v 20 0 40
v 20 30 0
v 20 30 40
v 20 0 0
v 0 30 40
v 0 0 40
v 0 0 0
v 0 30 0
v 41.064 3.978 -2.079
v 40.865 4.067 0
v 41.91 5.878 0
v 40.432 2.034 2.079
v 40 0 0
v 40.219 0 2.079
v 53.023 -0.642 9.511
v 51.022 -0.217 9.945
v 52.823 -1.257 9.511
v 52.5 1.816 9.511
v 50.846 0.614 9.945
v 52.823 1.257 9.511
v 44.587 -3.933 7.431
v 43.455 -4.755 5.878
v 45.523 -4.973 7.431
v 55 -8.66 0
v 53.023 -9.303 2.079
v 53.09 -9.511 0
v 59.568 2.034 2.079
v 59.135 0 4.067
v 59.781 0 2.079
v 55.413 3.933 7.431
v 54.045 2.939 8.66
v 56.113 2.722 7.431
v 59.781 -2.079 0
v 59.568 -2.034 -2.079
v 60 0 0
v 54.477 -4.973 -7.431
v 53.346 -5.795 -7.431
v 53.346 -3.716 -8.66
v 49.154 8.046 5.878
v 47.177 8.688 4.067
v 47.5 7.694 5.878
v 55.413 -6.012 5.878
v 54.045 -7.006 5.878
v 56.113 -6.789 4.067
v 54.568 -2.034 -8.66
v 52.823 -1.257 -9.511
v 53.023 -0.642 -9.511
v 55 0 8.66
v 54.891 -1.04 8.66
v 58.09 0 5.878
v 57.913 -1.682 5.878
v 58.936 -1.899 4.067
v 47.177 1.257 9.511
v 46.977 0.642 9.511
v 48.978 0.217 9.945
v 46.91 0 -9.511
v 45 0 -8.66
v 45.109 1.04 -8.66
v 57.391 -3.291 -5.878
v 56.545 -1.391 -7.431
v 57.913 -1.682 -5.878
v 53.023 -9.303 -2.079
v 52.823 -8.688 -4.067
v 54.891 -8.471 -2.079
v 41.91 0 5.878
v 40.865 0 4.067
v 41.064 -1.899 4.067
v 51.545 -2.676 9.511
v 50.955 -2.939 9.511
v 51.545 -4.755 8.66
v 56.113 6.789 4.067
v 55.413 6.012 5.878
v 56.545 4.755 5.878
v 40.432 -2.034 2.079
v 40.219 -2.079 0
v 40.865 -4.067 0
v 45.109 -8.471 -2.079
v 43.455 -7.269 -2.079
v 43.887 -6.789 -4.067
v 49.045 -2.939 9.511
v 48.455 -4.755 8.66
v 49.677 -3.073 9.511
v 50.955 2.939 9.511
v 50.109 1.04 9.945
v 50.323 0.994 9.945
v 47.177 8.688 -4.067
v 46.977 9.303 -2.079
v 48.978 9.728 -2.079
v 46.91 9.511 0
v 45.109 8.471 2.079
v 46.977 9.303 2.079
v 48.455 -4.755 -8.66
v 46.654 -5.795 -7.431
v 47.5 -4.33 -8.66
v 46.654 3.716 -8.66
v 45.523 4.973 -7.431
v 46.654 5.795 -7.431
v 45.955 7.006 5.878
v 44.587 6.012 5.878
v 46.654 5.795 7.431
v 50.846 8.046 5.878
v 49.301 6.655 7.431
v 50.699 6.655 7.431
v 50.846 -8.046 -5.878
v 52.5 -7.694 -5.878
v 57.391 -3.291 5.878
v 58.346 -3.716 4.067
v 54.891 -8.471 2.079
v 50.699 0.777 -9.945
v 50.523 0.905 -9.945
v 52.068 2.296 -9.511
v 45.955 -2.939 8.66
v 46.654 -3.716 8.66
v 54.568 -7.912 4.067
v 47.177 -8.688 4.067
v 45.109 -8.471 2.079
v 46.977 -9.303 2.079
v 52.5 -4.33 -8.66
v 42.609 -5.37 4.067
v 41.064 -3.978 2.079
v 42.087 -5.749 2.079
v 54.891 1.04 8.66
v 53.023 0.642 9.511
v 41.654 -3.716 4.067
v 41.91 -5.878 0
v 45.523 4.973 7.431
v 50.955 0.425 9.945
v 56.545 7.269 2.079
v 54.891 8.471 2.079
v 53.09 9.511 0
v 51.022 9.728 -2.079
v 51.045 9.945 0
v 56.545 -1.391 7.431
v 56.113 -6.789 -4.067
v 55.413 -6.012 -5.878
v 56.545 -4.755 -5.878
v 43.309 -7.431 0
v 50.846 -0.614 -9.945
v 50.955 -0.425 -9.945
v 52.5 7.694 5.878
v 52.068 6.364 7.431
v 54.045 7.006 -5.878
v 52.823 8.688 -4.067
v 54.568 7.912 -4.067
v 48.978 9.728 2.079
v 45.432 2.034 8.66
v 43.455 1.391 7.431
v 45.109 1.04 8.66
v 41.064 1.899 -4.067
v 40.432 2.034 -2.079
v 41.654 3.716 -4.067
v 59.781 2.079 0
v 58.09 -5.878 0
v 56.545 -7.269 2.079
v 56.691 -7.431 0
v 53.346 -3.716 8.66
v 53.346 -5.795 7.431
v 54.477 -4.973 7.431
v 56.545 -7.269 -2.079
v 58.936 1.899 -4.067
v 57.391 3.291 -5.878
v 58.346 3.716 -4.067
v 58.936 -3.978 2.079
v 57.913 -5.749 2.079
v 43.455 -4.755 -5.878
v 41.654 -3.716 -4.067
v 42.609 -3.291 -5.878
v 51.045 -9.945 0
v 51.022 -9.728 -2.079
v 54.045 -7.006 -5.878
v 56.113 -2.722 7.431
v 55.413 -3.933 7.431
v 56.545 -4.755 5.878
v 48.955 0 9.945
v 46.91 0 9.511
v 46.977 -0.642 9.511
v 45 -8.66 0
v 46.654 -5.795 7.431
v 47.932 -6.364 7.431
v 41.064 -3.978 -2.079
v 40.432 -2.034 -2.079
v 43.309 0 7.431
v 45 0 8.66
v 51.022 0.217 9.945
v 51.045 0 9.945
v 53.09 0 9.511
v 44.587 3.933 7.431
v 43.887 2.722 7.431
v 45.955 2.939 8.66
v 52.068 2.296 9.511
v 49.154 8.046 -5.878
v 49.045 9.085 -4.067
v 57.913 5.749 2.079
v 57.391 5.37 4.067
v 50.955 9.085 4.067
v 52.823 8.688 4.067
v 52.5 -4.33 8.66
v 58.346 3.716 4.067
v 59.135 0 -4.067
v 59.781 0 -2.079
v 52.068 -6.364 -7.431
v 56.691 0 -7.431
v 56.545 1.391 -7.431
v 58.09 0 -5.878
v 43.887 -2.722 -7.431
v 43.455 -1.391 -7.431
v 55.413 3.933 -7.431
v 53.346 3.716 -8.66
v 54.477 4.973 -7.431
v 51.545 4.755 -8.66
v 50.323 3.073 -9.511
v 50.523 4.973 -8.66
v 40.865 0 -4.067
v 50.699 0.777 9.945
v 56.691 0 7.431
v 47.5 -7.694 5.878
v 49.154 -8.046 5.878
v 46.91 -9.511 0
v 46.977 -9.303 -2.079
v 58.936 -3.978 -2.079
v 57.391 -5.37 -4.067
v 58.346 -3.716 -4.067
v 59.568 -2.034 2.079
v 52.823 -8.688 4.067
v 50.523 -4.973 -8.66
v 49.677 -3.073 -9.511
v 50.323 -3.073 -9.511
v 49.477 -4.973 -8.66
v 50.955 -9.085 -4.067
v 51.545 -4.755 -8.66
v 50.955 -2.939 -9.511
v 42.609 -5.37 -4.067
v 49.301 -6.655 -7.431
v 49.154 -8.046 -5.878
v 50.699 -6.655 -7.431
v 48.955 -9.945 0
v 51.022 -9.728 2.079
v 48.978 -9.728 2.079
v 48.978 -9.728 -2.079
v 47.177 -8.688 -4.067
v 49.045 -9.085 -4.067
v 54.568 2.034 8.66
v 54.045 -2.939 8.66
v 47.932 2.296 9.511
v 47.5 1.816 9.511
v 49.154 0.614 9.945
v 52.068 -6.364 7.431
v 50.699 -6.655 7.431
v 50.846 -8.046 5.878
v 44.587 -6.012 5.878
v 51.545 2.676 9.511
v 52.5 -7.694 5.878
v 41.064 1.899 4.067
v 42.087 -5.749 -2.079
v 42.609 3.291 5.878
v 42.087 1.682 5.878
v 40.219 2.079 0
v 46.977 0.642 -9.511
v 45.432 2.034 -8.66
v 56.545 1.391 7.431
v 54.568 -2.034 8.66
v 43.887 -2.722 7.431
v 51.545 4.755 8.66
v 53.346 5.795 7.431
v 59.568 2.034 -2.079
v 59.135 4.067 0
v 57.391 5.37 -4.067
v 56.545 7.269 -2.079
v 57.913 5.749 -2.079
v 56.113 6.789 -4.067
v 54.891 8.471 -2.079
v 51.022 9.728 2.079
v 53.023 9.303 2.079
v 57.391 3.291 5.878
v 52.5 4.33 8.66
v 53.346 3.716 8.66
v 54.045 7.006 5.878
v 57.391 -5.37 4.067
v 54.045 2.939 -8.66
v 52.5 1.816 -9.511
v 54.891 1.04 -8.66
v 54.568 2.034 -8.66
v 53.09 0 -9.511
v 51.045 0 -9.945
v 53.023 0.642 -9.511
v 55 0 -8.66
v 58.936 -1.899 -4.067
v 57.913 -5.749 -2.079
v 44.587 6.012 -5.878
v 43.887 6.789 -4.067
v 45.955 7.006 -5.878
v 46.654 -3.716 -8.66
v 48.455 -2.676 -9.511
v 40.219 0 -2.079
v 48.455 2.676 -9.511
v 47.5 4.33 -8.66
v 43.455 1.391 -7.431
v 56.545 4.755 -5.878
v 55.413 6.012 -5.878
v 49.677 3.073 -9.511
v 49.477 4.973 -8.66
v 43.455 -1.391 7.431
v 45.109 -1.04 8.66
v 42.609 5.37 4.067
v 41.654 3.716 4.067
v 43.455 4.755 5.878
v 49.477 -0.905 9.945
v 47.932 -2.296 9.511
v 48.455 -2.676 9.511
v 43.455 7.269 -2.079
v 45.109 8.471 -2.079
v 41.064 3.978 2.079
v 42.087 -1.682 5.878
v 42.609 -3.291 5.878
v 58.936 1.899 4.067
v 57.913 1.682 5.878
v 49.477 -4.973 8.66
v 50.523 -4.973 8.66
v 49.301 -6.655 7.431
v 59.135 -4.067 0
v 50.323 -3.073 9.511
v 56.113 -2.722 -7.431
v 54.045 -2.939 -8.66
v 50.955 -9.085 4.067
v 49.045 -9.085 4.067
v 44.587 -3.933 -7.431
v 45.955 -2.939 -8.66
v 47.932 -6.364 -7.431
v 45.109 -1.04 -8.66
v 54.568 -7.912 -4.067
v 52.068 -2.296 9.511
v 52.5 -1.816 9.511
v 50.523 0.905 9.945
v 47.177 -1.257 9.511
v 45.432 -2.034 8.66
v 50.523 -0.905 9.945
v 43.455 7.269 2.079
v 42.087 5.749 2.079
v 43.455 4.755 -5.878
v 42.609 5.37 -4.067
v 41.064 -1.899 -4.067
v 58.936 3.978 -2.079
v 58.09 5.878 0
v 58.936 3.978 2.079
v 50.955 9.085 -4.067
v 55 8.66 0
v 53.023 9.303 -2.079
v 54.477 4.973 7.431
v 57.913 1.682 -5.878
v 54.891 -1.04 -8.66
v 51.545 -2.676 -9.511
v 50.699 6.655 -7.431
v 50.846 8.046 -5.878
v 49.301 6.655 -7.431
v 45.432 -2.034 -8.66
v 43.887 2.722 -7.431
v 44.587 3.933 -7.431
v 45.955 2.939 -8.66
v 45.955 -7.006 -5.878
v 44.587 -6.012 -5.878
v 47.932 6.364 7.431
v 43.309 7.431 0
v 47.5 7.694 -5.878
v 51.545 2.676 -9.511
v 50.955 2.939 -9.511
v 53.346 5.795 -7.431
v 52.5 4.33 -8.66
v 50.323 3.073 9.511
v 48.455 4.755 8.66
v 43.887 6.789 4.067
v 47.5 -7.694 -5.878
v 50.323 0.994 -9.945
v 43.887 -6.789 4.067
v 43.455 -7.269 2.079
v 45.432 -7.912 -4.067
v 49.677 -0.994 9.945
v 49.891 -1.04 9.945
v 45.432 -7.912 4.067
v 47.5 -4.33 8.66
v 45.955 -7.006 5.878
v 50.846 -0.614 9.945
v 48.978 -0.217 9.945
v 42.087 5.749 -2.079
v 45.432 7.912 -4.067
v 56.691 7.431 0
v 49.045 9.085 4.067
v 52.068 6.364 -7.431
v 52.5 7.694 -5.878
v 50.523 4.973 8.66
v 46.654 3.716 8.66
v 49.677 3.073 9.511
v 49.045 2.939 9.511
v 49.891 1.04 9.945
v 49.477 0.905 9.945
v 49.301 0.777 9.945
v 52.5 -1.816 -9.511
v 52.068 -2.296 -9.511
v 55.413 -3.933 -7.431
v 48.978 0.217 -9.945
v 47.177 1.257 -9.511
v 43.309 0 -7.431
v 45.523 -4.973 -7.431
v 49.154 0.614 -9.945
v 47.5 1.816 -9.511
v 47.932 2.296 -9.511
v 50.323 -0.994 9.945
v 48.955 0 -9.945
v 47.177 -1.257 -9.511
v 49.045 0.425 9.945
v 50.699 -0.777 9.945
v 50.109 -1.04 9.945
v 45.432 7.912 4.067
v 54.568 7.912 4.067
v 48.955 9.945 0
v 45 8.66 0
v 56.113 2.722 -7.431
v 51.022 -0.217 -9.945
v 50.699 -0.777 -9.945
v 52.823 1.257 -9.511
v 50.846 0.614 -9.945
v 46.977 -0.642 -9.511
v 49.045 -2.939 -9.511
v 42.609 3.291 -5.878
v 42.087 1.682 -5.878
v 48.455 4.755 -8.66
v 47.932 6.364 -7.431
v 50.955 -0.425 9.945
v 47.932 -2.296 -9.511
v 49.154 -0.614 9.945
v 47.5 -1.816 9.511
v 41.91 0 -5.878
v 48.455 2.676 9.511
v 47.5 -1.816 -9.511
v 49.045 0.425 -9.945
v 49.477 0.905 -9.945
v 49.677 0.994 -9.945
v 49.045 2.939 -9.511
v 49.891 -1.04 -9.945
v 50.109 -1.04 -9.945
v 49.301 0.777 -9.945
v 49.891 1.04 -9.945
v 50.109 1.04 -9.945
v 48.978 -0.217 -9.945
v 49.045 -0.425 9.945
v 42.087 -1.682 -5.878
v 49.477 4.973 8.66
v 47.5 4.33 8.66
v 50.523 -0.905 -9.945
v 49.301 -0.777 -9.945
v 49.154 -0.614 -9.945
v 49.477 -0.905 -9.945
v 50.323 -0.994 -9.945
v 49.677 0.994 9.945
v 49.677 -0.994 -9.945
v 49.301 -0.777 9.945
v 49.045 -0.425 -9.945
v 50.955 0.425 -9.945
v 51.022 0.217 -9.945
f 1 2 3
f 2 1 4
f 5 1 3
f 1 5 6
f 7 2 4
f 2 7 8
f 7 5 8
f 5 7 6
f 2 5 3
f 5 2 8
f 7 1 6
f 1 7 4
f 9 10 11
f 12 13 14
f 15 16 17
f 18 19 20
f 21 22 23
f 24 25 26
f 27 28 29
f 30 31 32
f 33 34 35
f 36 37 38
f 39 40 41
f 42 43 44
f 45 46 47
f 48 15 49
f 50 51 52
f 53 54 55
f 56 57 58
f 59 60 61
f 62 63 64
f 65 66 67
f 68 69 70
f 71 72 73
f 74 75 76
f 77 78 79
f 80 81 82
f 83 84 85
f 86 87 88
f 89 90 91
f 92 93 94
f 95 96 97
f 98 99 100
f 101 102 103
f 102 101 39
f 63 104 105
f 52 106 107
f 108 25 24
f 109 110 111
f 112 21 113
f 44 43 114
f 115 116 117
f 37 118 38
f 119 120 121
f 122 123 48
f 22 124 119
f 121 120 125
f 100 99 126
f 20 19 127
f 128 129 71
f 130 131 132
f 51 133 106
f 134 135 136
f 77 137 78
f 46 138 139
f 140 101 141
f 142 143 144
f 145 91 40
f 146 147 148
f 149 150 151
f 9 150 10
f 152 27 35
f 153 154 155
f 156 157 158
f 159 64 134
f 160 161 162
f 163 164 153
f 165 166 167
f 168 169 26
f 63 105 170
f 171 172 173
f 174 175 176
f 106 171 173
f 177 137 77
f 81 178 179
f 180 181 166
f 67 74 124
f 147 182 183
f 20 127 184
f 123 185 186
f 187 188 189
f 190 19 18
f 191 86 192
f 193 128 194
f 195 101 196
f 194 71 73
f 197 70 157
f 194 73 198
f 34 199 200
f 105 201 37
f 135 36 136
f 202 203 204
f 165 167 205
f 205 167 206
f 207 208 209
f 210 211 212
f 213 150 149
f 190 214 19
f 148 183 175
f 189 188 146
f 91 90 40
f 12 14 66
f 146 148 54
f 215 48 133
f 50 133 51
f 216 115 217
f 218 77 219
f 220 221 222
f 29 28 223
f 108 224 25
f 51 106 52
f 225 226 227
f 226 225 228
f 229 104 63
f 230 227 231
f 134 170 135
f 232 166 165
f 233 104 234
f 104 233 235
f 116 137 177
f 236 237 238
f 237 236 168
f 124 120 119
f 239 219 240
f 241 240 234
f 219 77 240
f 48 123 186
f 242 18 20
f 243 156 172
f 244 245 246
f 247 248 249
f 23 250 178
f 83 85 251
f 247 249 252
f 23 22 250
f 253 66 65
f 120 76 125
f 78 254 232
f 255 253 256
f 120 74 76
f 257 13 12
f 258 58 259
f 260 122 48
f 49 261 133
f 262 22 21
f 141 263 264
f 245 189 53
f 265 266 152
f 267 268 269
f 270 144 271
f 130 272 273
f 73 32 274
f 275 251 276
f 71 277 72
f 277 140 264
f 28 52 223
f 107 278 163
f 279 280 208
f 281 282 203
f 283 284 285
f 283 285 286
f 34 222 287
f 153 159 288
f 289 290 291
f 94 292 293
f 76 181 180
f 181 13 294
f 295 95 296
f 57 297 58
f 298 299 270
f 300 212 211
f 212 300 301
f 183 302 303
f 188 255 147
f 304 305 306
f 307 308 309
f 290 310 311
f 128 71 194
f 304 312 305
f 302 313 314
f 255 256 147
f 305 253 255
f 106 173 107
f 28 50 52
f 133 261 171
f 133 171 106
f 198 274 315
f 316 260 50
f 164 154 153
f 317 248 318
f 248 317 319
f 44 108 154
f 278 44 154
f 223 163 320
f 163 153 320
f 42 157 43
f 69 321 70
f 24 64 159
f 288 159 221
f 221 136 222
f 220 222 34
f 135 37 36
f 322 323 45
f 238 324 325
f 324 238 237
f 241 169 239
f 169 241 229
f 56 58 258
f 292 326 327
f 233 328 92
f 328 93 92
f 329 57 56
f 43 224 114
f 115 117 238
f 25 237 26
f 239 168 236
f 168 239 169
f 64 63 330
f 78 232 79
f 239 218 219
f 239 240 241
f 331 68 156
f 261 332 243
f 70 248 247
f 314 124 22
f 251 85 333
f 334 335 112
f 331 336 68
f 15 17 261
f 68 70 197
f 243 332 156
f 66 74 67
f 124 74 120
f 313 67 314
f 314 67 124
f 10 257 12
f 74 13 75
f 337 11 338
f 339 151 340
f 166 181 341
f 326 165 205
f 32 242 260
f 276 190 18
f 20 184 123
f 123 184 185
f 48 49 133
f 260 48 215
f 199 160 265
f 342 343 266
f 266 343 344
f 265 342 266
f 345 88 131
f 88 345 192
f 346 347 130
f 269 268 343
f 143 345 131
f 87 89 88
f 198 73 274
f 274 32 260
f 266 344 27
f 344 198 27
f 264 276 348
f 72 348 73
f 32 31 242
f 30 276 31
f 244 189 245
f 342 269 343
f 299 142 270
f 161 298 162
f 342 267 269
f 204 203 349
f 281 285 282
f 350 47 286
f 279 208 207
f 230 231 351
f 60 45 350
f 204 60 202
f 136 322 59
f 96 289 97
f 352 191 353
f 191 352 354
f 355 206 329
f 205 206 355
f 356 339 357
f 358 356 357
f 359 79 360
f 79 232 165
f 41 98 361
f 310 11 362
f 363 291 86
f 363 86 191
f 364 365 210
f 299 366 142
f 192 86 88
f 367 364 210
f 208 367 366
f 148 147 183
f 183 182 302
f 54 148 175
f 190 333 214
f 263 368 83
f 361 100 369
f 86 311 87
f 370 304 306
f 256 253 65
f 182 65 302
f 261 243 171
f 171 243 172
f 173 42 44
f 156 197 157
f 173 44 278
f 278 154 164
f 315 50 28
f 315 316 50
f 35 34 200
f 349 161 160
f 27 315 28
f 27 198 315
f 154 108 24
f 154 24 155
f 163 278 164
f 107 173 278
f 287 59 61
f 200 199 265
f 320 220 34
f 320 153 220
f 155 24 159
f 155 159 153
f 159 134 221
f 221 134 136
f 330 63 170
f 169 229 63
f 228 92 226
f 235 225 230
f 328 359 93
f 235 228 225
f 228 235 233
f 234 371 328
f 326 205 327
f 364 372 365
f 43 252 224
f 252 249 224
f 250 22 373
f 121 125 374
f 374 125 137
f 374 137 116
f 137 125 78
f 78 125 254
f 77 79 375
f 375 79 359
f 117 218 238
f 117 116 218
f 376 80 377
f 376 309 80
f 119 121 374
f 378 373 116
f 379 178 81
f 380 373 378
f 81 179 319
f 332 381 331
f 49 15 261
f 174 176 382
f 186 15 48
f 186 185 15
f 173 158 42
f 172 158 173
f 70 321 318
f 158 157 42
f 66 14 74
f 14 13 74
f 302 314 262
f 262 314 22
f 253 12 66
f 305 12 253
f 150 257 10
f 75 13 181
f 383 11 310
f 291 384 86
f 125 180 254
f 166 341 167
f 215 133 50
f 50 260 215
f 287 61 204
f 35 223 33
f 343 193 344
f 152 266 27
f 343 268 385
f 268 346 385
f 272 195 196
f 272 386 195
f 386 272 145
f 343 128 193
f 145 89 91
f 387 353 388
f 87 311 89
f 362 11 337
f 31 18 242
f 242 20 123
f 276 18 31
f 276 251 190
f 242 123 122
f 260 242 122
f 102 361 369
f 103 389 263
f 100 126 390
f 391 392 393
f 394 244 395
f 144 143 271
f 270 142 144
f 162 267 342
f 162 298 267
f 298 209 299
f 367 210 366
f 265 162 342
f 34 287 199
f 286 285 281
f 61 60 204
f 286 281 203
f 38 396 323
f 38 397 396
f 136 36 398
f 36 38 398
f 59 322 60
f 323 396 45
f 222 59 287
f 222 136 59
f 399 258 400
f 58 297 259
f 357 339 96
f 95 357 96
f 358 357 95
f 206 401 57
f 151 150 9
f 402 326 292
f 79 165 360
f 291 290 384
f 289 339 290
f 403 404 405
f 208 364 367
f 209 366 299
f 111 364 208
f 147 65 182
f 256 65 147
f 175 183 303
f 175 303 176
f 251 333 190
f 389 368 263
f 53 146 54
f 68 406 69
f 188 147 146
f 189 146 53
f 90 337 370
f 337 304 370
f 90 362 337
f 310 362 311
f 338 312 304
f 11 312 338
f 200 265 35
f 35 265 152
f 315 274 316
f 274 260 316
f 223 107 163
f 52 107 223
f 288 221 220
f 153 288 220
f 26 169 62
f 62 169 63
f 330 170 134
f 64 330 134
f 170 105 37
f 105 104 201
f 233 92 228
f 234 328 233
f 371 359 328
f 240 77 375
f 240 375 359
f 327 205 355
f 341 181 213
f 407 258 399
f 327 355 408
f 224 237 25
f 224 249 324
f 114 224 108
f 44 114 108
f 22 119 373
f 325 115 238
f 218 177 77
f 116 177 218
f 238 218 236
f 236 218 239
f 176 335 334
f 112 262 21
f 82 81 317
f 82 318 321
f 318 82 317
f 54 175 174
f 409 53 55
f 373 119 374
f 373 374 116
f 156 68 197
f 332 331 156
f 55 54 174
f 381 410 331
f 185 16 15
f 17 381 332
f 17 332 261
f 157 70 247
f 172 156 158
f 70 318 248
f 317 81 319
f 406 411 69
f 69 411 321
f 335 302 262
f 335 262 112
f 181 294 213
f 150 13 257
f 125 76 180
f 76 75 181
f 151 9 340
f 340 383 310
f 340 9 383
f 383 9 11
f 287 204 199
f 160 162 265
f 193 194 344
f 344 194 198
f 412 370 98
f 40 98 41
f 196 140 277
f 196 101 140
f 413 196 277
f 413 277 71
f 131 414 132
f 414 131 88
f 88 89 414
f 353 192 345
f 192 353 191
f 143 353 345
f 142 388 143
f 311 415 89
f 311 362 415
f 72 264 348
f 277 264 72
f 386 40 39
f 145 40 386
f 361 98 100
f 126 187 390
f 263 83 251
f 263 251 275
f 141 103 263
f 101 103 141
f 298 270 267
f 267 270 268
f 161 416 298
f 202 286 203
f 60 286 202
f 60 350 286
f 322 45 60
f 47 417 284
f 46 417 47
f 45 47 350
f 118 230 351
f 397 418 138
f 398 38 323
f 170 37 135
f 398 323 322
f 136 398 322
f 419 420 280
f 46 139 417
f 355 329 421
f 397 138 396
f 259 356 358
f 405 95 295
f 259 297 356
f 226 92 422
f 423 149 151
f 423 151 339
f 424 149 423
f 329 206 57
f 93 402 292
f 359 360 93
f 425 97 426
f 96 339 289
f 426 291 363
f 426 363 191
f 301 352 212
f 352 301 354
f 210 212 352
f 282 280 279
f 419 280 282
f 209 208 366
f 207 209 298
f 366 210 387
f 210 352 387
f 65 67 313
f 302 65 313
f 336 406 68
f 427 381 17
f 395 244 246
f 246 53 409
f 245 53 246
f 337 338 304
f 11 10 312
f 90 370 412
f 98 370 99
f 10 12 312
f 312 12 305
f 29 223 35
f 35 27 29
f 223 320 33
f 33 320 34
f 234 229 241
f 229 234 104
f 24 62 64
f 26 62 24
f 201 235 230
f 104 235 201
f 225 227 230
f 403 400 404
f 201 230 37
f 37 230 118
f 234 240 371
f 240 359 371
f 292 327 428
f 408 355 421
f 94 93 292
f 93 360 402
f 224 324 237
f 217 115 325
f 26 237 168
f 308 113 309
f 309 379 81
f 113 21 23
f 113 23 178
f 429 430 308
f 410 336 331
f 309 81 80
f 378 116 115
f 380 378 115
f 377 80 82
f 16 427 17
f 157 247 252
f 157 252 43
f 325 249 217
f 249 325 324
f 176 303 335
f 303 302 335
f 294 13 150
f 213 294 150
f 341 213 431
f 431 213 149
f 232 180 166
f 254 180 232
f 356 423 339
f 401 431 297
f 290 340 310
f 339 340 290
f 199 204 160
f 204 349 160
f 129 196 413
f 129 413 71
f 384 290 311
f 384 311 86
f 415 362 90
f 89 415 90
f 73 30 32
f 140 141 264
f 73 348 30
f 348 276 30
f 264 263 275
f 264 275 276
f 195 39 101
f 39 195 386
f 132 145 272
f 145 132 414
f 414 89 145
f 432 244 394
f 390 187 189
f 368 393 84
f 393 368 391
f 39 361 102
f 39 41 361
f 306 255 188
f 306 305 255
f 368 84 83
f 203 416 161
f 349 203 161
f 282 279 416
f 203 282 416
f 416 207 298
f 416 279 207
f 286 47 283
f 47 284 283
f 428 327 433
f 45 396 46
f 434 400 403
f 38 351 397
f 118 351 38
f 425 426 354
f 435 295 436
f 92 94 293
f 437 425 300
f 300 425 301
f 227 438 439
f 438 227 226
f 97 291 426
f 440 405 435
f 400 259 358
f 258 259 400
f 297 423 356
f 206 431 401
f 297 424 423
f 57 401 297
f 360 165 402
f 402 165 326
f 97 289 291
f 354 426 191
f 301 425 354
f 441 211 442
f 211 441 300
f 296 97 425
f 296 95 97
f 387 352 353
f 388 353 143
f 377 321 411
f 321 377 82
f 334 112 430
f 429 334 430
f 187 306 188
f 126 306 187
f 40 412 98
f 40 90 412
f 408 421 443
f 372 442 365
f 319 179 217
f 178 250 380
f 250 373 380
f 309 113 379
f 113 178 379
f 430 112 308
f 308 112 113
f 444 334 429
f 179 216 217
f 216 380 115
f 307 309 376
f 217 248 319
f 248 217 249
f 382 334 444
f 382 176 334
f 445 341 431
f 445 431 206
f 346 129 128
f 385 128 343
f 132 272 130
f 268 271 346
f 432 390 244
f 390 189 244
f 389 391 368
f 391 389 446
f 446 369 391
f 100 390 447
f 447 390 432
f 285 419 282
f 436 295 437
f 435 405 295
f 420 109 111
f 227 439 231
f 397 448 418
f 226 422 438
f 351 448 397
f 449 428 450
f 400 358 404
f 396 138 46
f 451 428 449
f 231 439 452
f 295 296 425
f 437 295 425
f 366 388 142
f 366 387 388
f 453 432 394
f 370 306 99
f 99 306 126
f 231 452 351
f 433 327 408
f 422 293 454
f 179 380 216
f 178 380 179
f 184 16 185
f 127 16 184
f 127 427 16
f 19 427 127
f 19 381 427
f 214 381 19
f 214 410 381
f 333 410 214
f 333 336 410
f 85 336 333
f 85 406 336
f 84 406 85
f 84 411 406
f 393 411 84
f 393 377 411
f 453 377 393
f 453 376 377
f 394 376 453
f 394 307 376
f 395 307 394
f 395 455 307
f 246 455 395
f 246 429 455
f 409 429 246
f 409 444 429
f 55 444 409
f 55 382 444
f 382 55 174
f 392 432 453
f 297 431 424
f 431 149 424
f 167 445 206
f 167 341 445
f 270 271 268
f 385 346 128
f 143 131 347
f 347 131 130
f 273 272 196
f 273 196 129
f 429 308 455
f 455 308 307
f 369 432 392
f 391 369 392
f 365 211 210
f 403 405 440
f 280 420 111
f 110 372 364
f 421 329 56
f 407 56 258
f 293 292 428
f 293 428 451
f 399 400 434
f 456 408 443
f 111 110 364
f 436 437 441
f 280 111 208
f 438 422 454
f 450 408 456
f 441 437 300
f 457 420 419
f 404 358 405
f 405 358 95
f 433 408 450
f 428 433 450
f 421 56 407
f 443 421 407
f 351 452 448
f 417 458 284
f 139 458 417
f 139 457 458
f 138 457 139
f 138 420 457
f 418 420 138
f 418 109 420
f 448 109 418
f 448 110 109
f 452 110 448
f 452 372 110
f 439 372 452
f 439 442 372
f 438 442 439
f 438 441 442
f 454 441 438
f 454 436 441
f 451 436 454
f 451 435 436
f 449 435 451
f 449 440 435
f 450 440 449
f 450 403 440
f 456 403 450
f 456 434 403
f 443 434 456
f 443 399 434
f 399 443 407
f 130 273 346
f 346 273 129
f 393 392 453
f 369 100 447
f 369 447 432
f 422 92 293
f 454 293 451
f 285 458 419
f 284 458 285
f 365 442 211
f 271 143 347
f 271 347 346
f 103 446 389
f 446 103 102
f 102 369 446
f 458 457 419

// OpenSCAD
// file: ../../lib/utilities/bounding_box_utils.scad
// lib/utilities/bounding_box_utils.scad

/**
 * Fits an object within a specified bounding box.
 *
 * @param size Bounding box size [x, y, z].
 * @param obj_size Original object size [x, y, z].
 */
module fitToBoundingBox(size, obj_size) {
    scale([size[0] / obj_size[0], size[1] / obj_size[1], size[2] / obj_size[2]])
    children();
}
// main file
// tests/utilities/test_bounding_box_utils.scad

use <../../lib/utilities/bounding_box_utils.scad>

module testBoundingBoxUtils() {
    // Original cube size is [20, 30, 40]
    cube_size = [20, 30, 40];
    cube([20, 30, 40]);
    
    // Fit the sphere to the bounding box of [20, 20, 20]
    translate([50, 0, 0])
    fitToBoundingBox([20, 20, 20], [30, 30, 30])
    sphere(15);
}

testBoundingBoxUtils();
